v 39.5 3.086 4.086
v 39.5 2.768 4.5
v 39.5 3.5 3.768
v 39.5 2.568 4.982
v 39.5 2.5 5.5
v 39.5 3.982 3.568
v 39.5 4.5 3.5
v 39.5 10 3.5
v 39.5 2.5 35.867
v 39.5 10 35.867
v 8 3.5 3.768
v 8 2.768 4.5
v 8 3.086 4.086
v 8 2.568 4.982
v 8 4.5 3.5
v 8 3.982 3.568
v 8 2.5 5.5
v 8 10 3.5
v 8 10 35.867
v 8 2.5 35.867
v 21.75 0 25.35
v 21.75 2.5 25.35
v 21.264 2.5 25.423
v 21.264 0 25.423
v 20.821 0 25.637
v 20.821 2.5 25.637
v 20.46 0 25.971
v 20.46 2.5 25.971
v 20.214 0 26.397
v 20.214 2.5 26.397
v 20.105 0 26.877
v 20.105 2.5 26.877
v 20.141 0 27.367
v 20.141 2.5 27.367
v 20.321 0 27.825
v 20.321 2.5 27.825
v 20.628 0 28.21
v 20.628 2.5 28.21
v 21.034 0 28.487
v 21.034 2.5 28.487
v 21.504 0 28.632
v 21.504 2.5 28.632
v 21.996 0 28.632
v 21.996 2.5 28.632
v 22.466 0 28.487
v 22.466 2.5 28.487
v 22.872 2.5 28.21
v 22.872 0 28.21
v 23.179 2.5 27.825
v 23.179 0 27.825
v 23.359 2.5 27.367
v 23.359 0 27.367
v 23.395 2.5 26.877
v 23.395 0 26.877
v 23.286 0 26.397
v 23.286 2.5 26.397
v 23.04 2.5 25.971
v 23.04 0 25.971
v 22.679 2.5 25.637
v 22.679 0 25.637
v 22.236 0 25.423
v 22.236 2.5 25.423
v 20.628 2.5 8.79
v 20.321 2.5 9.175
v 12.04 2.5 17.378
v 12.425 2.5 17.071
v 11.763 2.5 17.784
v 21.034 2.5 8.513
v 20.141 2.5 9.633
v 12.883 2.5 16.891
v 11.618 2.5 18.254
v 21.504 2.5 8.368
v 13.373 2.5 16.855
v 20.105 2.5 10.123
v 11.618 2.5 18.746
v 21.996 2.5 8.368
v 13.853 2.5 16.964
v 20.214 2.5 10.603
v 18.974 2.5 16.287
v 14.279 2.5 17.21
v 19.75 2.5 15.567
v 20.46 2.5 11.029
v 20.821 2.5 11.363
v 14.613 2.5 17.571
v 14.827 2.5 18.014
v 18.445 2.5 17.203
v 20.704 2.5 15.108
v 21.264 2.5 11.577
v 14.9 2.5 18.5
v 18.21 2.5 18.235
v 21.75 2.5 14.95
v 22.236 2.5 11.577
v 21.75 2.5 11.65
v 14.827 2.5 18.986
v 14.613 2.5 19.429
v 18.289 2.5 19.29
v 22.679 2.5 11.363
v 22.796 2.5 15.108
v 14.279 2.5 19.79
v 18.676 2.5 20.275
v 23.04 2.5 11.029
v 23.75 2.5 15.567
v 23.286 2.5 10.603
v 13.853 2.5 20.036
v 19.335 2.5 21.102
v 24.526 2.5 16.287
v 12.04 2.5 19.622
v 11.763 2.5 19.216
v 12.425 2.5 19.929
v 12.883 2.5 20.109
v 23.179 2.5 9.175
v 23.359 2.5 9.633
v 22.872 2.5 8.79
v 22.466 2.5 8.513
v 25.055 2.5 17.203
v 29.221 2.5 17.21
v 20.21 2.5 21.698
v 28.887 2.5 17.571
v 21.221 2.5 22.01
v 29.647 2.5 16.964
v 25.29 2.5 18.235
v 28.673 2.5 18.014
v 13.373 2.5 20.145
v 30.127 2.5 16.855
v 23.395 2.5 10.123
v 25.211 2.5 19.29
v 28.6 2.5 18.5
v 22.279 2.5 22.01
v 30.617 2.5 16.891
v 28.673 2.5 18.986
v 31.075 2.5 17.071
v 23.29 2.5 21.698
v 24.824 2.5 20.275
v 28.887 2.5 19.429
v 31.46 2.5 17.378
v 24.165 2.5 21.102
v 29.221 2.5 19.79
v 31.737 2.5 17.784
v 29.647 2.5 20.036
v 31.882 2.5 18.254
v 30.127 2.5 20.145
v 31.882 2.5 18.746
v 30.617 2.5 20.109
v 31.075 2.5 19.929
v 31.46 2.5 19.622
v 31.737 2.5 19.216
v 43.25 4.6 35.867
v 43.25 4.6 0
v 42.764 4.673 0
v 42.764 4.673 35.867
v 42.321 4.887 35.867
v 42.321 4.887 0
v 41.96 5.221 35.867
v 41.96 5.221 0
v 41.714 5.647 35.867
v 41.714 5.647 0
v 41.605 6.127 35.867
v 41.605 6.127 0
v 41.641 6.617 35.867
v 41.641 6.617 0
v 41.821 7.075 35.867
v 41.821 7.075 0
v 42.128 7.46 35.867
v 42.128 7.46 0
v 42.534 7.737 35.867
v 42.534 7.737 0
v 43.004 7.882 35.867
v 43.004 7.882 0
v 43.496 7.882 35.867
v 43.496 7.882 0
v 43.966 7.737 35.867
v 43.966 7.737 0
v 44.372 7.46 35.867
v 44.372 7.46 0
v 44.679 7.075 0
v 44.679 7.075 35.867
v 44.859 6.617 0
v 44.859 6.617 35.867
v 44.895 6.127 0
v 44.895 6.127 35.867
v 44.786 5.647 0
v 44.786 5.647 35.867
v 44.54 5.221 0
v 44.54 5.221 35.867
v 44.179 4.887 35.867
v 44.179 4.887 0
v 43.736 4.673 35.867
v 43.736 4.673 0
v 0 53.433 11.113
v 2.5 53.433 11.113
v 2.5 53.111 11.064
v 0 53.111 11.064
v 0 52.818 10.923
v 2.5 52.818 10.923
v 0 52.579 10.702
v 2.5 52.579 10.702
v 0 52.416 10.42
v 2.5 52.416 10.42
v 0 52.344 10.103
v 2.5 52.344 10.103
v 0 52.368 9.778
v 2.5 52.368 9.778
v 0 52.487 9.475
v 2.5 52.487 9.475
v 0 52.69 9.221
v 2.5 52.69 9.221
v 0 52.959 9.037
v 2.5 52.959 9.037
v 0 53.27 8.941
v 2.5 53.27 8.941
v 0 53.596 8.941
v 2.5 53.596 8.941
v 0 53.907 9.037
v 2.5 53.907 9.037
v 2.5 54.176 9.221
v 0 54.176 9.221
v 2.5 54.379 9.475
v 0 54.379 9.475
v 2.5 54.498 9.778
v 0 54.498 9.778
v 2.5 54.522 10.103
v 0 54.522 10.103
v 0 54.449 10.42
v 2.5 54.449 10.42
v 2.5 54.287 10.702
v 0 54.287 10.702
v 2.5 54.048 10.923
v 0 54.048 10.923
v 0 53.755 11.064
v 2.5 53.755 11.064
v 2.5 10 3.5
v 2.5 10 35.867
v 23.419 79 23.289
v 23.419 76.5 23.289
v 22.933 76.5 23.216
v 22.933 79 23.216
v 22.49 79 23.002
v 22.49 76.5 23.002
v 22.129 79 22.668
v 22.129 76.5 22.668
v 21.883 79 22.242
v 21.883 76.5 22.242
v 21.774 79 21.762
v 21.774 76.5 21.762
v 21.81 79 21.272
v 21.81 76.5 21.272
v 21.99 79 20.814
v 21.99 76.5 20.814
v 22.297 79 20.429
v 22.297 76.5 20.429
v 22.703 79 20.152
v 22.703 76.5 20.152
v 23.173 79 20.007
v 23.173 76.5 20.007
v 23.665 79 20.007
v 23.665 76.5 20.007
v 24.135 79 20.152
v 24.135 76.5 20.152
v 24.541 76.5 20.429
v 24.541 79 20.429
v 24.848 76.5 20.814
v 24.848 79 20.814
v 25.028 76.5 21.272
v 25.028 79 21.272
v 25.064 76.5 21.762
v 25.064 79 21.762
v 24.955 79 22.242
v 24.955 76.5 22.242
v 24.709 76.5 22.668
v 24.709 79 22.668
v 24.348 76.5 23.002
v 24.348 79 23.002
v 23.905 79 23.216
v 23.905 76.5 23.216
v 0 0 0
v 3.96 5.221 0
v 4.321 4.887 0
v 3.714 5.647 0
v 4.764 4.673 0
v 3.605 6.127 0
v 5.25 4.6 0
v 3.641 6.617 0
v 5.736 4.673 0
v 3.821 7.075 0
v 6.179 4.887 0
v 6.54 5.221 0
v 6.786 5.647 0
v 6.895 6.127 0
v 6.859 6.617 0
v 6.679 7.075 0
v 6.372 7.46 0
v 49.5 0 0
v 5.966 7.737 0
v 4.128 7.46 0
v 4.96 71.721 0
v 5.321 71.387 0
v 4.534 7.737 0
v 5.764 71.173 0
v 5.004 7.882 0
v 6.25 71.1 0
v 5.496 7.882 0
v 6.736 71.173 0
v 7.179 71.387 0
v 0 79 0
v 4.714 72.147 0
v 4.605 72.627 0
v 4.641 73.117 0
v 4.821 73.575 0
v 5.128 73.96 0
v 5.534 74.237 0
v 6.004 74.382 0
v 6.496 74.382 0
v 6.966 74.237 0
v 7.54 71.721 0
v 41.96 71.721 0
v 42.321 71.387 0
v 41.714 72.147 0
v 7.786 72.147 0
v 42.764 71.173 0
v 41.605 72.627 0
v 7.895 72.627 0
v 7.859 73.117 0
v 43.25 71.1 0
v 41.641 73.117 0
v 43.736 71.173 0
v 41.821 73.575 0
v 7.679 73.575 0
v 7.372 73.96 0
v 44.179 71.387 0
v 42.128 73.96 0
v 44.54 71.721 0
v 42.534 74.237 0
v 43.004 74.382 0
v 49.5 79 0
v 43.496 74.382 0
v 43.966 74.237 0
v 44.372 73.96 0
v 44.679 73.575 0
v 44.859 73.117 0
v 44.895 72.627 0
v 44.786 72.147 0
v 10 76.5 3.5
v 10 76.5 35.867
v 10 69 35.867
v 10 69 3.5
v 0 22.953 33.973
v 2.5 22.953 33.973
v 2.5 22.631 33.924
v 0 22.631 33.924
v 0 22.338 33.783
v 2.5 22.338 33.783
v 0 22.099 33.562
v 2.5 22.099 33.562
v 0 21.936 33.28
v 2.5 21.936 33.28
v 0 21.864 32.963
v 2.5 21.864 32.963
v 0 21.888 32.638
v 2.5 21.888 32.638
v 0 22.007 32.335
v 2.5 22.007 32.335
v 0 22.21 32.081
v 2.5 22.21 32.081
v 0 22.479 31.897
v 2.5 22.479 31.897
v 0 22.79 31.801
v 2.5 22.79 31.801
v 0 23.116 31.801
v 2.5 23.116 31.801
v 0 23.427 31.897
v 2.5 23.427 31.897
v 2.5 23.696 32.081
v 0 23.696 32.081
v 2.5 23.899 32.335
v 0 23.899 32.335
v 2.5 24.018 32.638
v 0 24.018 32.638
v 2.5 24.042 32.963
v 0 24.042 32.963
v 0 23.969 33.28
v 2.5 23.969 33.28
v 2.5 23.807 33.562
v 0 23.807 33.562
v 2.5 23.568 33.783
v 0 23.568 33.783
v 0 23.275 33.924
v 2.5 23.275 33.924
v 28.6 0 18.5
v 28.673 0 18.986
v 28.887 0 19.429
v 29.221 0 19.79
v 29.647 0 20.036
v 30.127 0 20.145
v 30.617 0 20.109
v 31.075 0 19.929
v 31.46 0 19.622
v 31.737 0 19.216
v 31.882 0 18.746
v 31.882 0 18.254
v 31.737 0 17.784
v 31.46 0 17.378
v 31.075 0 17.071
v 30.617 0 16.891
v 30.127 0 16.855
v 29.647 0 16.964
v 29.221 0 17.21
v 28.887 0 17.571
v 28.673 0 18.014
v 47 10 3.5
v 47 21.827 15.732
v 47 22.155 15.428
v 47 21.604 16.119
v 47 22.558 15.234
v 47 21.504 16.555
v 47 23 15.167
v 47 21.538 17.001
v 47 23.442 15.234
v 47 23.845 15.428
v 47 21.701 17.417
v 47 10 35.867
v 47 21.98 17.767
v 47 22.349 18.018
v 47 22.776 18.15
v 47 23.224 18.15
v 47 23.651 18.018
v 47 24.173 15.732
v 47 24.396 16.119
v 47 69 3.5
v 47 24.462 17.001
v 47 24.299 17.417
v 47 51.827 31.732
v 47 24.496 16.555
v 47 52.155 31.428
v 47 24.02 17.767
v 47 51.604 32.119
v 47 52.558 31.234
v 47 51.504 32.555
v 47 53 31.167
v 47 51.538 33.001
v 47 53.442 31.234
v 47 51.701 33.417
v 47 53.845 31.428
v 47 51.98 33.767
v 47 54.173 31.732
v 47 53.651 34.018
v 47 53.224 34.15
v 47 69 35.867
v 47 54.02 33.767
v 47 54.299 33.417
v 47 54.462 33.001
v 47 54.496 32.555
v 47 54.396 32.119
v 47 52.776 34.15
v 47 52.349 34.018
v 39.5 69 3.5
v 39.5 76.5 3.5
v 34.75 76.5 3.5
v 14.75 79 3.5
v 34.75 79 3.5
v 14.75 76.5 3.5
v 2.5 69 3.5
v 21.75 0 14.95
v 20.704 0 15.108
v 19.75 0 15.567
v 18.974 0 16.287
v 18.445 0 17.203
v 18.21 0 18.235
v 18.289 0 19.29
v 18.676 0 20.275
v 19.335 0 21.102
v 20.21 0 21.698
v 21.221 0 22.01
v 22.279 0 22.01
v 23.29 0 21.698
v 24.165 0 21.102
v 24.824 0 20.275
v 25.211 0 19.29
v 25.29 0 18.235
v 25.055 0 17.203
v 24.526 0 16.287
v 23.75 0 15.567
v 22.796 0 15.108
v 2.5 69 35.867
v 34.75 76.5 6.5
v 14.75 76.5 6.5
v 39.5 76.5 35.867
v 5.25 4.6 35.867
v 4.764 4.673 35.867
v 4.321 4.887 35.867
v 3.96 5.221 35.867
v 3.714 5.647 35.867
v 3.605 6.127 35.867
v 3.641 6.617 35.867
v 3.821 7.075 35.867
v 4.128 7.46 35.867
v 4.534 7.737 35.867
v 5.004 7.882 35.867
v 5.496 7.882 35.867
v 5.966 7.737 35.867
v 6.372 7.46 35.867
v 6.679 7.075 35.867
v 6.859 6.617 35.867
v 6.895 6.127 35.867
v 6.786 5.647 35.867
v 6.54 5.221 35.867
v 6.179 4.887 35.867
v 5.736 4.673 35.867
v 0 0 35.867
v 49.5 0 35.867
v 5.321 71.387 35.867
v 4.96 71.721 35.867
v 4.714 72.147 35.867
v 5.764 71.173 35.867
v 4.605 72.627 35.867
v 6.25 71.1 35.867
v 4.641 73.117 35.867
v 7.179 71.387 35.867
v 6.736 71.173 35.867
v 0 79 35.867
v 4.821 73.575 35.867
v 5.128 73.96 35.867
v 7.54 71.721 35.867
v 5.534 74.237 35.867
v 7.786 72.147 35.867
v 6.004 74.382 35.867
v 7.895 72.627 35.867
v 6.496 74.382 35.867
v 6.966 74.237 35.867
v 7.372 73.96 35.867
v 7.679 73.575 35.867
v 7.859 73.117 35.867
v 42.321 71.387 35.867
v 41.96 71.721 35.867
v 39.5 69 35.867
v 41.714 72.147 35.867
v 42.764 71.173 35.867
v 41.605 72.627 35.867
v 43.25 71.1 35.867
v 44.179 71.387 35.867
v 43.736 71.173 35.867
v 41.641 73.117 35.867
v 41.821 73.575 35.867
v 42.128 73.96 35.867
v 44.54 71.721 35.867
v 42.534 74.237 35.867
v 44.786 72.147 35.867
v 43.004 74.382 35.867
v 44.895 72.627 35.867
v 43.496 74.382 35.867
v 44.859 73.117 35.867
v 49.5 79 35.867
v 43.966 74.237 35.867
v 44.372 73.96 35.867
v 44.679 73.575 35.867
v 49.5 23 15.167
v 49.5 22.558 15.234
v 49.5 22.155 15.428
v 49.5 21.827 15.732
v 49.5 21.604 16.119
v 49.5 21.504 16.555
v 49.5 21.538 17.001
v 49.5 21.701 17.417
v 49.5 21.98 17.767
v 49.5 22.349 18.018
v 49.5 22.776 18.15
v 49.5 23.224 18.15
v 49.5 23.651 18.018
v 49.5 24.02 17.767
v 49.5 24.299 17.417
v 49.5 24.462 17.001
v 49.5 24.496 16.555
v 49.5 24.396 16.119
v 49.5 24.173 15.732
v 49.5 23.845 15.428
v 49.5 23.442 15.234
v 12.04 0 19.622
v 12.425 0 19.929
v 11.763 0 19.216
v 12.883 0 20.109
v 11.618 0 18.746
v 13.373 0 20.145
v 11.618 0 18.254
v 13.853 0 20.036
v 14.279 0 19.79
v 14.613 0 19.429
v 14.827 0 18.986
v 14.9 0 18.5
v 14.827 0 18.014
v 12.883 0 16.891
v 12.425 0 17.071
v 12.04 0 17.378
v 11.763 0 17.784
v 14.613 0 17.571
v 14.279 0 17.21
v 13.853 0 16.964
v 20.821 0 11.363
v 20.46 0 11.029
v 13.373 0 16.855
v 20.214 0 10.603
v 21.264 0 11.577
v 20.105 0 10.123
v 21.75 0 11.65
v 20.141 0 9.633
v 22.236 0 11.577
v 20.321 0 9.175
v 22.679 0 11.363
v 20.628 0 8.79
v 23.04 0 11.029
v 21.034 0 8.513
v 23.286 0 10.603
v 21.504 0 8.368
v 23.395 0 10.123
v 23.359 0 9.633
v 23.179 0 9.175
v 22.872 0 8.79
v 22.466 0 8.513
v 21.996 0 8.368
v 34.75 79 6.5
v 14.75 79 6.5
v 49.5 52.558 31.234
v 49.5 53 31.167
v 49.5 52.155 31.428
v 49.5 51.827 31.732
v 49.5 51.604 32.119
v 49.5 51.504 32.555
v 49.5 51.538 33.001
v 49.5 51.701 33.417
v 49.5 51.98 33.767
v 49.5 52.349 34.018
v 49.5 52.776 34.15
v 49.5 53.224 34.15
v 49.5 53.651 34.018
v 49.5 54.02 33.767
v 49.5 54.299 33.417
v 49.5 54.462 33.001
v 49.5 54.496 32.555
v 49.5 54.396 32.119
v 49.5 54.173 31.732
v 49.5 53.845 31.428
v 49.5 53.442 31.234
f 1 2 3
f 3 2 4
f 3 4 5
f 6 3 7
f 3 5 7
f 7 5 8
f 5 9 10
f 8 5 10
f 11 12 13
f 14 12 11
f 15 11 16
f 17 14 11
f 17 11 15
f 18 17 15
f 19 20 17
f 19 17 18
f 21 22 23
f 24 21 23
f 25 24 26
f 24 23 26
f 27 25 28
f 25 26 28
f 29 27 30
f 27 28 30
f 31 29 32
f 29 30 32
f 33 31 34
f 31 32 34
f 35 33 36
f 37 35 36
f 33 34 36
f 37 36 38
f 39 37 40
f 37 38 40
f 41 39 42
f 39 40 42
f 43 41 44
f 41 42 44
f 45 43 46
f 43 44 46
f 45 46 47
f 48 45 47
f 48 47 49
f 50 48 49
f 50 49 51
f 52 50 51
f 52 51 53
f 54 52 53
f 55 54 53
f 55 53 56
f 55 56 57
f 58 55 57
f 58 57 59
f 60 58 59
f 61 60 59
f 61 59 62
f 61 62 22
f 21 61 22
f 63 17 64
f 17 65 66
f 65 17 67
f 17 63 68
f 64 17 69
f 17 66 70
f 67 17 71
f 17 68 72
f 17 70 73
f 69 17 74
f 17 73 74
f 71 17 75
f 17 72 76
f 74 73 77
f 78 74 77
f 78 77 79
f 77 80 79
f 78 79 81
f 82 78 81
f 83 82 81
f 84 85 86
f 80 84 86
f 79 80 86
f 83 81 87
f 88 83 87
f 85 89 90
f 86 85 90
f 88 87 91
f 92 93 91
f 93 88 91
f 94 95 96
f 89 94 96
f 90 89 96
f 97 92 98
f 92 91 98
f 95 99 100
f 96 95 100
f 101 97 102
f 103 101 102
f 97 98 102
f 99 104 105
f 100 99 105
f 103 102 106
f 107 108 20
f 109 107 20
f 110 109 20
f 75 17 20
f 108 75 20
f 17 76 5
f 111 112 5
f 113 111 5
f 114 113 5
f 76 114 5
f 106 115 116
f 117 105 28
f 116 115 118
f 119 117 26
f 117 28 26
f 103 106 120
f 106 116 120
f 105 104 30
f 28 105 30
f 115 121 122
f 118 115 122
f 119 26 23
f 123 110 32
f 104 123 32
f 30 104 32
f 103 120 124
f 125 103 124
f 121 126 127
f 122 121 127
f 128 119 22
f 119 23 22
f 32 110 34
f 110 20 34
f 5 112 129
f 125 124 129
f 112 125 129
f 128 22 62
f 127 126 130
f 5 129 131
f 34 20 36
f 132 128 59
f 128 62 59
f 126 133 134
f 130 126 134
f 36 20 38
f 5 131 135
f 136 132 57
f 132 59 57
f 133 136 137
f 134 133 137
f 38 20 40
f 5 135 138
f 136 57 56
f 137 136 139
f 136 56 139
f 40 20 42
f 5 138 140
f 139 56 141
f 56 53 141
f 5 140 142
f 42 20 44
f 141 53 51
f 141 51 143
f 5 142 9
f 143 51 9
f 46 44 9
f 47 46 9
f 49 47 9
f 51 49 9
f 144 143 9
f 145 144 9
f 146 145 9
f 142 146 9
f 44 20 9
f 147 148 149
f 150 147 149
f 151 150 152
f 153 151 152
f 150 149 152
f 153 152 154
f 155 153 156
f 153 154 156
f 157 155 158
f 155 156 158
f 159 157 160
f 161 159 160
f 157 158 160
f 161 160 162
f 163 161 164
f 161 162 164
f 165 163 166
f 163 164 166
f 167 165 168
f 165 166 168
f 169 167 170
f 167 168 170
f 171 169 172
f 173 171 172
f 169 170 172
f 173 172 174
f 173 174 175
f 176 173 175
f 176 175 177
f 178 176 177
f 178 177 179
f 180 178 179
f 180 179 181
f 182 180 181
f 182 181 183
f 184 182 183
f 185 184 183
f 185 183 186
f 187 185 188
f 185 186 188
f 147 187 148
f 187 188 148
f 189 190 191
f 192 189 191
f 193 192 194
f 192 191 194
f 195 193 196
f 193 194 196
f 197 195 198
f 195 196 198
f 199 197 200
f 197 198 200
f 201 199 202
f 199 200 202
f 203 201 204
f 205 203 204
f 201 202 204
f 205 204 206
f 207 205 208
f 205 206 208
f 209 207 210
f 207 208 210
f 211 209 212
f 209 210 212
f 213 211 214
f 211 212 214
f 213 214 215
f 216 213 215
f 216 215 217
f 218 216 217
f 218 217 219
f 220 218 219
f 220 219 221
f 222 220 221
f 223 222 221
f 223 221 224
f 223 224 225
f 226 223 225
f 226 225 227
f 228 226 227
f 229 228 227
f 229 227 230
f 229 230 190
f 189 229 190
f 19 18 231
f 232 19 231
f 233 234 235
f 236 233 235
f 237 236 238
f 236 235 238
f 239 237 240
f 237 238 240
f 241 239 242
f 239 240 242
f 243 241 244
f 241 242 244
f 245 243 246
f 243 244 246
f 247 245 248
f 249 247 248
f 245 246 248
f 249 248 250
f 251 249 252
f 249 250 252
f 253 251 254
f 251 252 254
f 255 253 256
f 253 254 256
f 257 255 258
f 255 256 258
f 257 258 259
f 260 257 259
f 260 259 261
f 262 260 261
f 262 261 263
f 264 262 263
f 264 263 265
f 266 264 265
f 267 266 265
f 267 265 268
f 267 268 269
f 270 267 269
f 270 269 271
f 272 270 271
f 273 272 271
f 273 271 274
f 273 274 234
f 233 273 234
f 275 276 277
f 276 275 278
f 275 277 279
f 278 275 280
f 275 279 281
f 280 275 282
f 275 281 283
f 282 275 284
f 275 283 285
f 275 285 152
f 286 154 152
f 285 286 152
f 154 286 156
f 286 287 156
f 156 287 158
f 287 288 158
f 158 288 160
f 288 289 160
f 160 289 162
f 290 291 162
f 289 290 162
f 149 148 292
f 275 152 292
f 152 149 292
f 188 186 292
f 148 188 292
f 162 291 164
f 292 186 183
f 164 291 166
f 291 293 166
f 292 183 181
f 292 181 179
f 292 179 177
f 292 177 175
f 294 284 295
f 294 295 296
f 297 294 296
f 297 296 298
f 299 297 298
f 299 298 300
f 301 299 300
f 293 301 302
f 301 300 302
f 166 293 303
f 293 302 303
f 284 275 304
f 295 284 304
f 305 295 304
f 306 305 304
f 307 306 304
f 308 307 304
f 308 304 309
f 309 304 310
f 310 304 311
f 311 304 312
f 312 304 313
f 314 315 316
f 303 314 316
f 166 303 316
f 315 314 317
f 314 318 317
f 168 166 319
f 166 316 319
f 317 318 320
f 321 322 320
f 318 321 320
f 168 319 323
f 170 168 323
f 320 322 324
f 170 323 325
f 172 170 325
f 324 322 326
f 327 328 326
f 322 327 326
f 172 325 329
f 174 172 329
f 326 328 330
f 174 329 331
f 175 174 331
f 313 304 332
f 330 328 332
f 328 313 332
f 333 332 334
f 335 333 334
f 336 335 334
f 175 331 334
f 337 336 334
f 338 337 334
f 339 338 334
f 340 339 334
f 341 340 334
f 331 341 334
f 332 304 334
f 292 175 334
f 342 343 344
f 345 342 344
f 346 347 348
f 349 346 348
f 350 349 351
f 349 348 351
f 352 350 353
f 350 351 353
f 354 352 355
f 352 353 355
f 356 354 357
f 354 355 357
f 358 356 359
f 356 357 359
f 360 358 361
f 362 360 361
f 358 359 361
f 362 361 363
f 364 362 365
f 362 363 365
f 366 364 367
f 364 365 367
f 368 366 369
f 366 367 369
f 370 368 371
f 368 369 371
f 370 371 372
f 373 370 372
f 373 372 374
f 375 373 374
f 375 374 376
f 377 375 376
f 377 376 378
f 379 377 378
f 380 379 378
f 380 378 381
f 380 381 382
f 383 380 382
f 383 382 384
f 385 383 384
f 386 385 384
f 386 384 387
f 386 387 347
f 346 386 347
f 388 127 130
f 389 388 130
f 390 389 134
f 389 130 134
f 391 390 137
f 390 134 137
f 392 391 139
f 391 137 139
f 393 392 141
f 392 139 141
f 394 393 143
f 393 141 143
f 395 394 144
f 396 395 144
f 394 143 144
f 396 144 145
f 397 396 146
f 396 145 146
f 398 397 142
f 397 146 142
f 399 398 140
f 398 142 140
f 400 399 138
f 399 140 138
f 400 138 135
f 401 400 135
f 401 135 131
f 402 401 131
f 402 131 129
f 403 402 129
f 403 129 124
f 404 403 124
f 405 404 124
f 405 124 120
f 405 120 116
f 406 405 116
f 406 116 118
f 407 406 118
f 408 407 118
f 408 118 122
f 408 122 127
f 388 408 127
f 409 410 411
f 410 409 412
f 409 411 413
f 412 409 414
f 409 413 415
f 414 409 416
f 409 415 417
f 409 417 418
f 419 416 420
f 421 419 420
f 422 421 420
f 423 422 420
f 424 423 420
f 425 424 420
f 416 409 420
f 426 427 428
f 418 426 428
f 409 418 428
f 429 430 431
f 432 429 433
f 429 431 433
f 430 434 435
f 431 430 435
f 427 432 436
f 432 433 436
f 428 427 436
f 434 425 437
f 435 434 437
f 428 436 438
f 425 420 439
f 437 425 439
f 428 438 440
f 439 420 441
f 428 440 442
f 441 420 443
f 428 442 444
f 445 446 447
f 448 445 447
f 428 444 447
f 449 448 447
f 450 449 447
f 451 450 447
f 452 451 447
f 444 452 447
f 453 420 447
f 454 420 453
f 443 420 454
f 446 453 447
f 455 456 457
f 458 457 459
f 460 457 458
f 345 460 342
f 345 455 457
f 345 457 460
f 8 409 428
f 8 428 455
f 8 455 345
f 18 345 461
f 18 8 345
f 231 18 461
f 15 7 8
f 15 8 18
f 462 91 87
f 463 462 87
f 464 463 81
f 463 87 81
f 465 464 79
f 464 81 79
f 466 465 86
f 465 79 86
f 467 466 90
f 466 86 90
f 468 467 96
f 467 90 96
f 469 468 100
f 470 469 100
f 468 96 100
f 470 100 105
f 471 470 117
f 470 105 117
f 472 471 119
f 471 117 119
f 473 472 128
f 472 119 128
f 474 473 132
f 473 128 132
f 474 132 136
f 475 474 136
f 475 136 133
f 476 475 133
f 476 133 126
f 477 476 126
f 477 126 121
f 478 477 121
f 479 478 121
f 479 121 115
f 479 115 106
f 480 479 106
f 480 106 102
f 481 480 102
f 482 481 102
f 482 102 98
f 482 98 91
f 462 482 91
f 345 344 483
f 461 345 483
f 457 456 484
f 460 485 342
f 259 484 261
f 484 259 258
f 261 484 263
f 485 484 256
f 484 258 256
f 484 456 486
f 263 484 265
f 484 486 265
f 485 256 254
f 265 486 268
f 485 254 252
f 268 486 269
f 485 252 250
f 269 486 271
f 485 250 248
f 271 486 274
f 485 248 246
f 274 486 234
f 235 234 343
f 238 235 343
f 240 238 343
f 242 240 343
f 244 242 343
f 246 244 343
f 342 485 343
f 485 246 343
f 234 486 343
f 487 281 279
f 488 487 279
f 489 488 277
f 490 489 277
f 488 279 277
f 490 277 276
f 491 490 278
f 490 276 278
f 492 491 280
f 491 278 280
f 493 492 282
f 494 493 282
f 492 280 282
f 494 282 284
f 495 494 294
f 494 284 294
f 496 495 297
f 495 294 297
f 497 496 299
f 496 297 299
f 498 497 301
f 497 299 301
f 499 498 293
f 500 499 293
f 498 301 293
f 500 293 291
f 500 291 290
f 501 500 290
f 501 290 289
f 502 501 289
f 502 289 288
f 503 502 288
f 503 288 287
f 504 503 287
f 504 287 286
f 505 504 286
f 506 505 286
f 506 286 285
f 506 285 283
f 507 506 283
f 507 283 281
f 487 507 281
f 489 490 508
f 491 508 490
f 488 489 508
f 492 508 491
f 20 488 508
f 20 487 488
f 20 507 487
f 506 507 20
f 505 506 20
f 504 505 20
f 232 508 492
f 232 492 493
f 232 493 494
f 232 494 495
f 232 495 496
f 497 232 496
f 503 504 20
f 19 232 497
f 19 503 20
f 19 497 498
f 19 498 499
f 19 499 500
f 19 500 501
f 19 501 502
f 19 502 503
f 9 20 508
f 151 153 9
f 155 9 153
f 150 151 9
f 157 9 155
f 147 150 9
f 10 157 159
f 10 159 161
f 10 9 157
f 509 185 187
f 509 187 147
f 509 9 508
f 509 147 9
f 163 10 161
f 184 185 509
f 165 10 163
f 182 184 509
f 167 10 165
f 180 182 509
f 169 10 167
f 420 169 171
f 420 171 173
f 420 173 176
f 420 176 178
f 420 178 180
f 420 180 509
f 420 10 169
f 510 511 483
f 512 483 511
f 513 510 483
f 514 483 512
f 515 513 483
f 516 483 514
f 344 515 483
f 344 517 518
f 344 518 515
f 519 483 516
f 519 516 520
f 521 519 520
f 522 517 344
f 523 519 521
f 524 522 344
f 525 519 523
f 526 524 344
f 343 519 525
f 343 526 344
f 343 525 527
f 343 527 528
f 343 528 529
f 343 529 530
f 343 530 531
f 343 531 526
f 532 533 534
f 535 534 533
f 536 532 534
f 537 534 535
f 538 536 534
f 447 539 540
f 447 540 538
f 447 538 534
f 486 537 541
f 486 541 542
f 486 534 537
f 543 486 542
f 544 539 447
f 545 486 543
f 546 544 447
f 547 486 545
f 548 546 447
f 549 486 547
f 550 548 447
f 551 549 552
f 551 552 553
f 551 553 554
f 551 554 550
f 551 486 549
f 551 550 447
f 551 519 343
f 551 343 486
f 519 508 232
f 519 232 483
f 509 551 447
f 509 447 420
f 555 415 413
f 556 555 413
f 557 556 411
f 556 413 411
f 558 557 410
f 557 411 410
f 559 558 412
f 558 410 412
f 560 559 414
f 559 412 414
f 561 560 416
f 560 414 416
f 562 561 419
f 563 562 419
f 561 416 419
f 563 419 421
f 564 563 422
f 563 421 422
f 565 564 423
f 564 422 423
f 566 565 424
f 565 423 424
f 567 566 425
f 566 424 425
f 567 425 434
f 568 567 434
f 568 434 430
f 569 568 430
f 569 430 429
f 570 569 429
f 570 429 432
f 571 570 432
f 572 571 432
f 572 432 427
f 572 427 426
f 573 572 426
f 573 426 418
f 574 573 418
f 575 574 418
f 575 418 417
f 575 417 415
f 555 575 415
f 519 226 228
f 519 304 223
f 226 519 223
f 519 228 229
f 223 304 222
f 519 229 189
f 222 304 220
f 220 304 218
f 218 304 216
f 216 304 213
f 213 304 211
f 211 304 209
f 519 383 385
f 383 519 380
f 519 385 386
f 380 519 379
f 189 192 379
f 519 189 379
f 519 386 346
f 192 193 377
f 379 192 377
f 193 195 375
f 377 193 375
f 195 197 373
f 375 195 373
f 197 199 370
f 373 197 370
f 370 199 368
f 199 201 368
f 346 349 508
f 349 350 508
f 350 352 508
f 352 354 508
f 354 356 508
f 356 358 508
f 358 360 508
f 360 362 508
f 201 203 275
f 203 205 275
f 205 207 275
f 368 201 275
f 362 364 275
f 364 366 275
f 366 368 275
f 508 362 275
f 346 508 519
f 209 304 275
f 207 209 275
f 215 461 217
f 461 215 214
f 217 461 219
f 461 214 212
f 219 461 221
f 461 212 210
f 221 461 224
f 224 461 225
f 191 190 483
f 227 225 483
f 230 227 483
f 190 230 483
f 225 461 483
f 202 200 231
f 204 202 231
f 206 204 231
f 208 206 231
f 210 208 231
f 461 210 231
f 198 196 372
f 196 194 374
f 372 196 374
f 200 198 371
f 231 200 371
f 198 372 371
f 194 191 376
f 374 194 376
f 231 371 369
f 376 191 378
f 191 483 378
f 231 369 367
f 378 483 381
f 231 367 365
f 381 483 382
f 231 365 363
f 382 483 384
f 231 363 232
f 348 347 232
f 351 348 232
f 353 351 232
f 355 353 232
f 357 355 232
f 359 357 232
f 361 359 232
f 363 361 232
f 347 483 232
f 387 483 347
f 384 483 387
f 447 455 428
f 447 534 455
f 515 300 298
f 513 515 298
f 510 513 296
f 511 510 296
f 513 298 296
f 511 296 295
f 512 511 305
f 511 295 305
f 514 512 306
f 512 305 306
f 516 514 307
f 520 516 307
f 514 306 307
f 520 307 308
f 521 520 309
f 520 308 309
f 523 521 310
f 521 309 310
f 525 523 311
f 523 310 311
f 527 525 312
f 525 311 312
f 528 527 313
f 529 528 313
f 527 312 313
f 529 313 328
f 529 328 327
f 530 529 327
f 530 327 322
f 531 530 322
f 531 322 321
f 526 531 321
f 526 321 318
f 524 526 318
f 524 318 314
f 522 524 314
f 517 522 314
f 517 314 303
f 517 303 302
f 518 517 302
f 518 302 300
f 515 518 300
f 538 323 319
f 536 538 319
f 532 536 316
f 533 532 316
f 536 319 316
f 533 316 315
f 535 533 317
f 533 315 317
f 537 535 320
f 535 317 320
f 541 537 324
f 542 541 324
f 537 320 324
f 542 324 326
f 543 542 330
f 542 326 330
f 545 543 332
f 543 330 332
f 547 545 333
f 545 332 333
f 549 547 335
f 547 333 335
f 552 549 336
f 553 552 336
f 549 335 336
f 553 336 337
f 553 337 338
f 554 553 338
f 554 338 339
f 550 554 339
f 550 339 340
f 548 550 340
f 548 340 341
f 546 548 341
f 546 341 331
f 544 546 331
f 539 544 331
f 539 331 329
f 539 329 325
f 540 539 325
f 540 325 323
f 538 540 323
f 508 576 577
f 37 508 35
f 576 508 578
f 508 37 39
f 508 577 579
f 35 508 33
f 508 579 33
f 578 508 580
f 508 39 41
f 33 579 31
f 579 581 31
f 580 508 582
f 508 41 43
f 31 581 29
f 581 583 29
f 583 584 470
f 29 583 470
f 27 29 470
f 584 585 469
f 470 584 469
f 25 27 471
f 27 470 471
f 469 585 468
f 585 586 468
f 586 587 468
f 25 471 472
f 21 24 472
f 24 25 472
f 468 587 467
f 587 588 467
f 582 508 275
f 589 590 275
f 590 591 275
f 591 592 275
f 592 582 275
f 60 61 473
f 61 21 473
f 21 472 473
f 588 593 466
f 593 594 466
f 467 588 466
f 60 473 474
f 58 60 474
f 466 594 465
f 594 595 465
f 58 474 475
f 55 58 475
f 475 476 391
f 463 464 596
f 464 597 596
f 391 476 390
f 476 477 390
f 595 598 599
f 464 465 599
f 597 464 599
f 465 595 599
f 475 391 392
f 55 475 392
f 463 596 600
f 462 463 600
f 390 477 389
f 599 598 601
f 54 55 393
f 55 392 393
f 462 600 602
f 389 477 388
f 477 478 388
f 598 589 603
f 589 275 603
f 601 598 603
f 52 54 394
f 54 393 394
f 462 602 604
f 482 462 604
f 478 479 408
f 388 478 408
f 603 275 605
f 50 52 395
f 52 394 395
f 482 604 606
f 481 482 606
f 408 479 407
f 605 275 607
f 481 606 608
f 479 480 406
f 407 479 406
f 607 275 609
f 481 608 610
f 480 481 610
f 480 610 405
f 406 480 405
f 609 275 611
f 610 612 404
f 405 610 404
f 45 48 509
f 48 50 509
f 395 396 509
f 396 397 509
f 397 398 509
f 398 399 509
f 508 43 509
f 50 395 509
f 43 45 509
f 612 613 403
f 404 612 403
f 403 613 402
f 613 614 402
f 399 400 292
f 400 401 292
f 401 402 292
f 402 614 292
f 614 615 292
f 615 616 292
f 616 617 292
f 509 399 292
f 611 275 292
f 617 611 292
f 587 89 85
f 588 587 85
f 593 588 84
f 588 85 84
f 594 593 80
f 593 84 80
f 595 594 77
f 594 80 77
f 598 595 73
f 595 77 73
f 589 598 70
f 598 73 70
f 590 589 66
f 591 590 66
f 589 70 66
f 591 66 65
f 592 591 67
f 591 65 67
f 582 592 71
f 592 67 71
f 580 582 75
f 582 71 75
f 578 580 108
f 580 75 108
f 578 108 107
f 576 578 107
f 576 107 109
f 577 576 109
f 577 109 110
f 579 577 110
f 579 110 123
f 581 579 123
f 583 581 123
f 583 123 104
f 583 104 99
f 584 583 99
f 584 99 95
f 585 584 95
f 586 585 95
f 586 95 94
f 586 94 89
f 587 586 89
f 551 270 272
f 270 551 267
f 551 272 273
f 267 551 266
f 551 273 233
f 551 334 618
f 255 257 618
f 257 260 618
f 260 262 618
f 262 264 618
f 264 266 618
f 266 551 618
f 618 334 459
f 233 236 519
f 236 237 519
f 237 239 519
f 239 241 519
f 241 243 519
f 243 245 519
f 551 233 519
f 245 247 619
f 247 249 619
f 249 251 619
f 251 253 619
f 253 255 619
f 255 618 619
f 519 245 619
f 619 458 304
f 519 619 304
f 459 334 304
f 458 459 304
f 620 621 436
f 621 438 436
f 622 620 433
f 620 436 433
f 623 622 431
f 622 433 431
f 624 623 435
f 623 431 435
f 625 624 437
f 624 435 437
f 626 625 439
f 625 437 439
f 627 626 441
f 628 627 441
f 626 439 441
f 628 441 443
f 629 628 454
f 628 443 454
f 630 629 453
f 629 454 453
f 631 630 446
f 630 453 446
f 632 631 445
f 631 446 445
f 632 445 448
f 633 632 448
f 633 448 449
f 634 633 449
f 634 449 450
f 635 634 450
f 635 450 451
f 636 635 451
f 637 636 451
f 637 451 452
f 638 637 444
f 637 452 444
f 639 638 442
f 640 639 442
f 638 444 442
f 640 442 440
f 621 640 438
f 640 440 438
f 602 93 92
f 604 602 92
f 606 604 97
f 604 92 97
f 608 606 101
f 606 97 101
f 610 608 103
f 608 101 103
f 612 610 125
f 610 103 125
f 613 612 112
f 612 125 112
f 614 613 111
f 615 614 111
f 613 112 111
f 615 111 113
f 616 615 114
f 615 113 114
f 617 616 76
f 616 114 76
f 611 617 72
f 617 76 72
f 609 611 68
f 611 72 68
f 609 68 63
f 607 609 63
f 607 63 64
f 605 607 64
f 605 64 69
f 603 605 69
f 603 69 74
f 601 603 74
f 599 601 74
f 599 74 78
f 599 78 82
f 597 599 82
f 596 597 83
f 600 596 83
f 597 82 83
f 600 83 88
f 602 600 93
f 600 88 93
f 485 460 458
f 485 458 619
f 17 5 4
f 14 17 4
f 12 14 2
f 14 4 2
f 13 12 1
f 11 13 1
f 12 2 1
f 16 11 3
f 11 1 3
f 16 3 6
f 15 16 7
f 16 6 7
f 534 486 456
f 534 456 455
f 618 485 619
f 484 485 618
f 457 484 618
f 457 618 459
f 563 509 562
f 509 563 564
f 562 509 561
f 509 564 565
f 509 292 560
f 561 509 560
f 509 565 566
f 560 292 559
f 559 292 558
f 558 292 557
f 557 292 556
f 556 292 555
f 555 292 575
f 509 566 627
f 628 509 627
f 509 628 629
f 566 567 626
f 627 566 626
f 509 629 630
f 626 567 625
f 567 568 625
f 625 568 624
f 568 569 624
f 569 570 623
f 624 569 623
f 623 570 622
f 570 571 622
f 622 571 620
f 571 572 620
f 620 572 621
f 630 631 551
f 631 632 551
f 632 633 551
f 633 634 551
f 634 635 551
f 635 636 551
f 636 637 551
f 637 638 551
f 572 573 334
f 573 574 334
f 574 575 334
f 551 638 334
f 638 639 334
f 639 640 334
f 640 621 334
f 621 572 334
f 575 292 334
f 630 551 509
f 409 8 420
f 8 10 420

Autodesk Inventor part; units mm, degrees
ref_plane "YZ Plane" through (0, 0, 0) normal (1, 0, 0) x (0, 1, 0)
ref_plane "XZ Plane" through (0, 0, 0) normal (0, 1, 0) x (-1, 0, 0)
ref_plane "XY Plane" through (0, 0, 0) normal (0, 0, 1) x (1, 0, 0)
sketch "Sketch1" plane through (0, 0, 0) normal (0, 0, 1) x (1, 0, 0)
  line L0 (0, 0) -> (49.5, 0)
  line L1 (49.5, 0) -> (49.5, 79)
  line L2 (49.5, 79) -> (0, 79)
  line L3 (0, 79) -> (0, 0)
  dimension "d0" = 49.5
  dimension "d1" = 79
extrude "Extrusion1" add sketch "Sketch1" along normal blind 35.867
sketch "Sketch2" plane through (0, 0, 35.867) normal (0, 0, 1) x (1, 0, 0)
  line L0 (0, 79) -> (0, 0) construction
  line L1 (49.5, 79) -> (0, 79) construction
  line L2 (49.5, 0) -> (49.5, 79) construction
  line L3 (0, 0) -> (49.5, 0) construction
  line L4 (2.5, 2.5) -> (47, 2.5)
  line L5 (47, 2.5) -> (47, 76.5)
  line L6 (47, 76.5) -> (2.5, 76.5)
  line L7 (2.5, 76.5) -> (2.5, 2.5)
  dimension "d4" = 2.5
  dimension "d5" = 2.5
  dimension "d6" = 2.5
  dimension "d7" = 2.5
extrude "Extrusion2" cut sketch "Sketch2" against normal blind 32.367
sketch "Sketch3" plane through (0, 0, 0) normal (0, -1, 0) x (1, 0, 0)
  line L0 (0, 0) -> (49.5, 0) construction
  line L1 (49.5, 0) -> (49.5, 35.867) construction
  line L2 (0, 35.867) -> (49.5, 35.867) construction
  line L3 (0, 0) -> (0, 35.867) construction
  point P0 (21.75, 18.5)
  point P1 (24.75, 35.867)
  dimension "d12" = 17.367
  dimension "d31" = 21.75
hole "Hole1" at (21.75, 0, 18.5) direction (0, 1, 0) diameter 7.1 depth 2.5
sketch "Sketch4" plane through (0, 0, 0) normal (0, -1, 0) x (1, 0, 0)
  circle A0 centre (21.75, 18.5) radius 3.55 construction
  line L0 (0, 0) -> (49.5, 0) construction
  line L1 (49.5, 0) -> (49.5, 35.867) construction
  line L2 (0, 35.867) -> (49.5, 35.867) construction
  line L3 (0, 0) -> (0, 35.867) construction
  point P0 (21.75, 27)
  dimension "d20" = 8.5
hole "Hole2" at (21.75, 0, 27) direction (0, 1, 0) diameter 3.3 depth 2.5
pattern_circular "Circular Pattern1" count 4 over 360 about axis through (21.75, 99.8884, 18.5) along (0, -1, 0) of "Hole2"
sketch "Sketch5" plane through (0, 0, 0) normal (-1, 0, 0) x (0, 0, 1)
  line L0 (35.867, 79) -> (35.867, 0) projected
  line L1 (0, 0) -> (35.867, 0) projected
  point P0 (32.881, 22.9529)
  point P1 (10.021, 53.4329)
  dimension "d32" = 2.986
  dimension "d33" = 30.48
  dimension "d34" = 22.86
  dimension "d35" = 22.9529
hole "Hole3" at (0, 22.9529, 32.881) at (0, 53.4329, 10.021) direction (1, 0, 0) diameter 2.184 depth 2.5
fillet "Fillet3" radius 2 3 edges at (24.75, 2.5, 3.5) (47, 2.5, 19.6835) (2.5, 2.5, 19.6835)
sketch "Sketch6" plane through (49.5, 0, 0) normal (1, 0, 0) x (0, 0, -1)
  line L0 (-35.867, 0) -> (-35.867, 79) projected
  line L1 (0, 79) -> (-35.867, 79) projected
  point P0 (0, 0)
  point P1 (-16.667, 23)
  point P2 (-32.667, 53)
  dimension "d44" = 30
  dimension "d47" = 26
  dimension "d55" = 3.2
  dimension "d56" = 16
hole "Hole4" at (49.5, 23, 16.667) at (49.5, 53, 32.667) direction (-1, 0, 0) diameter 3 depth 2.5
sketch "Sketch7" plane through (0, 0, 35.867) normal (0, 0, 1) x (1, 0, 0)
  line L0 (49.5, 0) -> (39.5, 0)
  line L1 (39.5, 0) -> (39.5, 10)
  line L2 (39.5, 10) -> (49.5, 10)
  line L3 (49.5, 10) -> (49.5, 0)
  line L4 (0, 0) -> (8, 0)
  line L5 (8, 0) -> (8, 10)
  line L6 (8, 10) -> (0, 10)
  line L7 (0, 10) -> (0, 0)
  line L8 (0, 79) -> (10, 79)
  line L9 (10, 79) -> (10, 69)
  line L10 (10, 69) -> (0, 69)
  line L11 (0, 69) -> (0, 79)
  line L12 (49.5, 79) -> (39.5, 79)
  line L13 (39.5, 79) -> (39.5, 69)
  line L14 (39.5, 69) -> (49.5, 69)
  line L15 (49.5, 69) -> (49.5, 79)
  line L16 (49.5, 79) -> (0, 79) projected
  line L17 (49.5, 0) -> (49.5, 79) projected
  point P0 (4, 0)
  point P1 (44.5, 0)
  point P2 (5, 79)
  point P3 (44.5, 79)
  point P4 (49.5, 74)
  point P5 (49.5, 5)
  point P6 (0, 74)
  point P7 (0, 5)
  point P8 (24.75, 79)
  point P9 (49.5, 39.5)
  dimension "d57" = 10
  dimension "d58" = 8
  dimension "d59" = 10
  dimension "d60" = 10
  dimension "d61" = 10
  dimension "d62" = 10
  dimension "d63" = 10
  dimension "d64" = 10
extrude "Extrusion3" add sketch "Sketch7" against normal up to surface (32.367 mm away)
sketch "Sketch8" plane through (0, 0, 35.867) normal (0, 0, 1) x (1, 0, 0)
  line L0 (39.5, 2.5) -> (8, 2.5) construction
  line L1 (8, 2.5) -> (8, 10) construction
  line L2 (8, 10) -> (2.5, 10) construction
  line L3 (2.5, 10) -> (2.5, 69) construction
  line L4 (2.5, 69) -> (10, 69) construction
  line L5 (10, 69) -> (10, 76.5) construction
  line L6 (10, 76.5) -> (39.5, 76.5) construction
  line L7 (39.5, 76.5) -> (39.5, 69) construction
  line L8 (39.5, 69) -> (47, 69) construction
  line L9 (47, 69) -> (47, 10) construction
  line L10 (47, 10) -> (39.5, 10) construction
  line L11 (39.5, 10) -> (39.5, 2.5) construction
  line L12 (49.5, 79) -> (0, 79) construction
  line L13 (0, 79) -> (0, 0) construction
  line L14 (0, 0) -> (49.5, 0) construction
  line L15 (49.5, 0) -> (49.5, 79) construction
  point P0 (5.25, 6.25)
  point P1 (43.25, 6.25)
  point P2 (43.25, 72.75)
  point P3 (6.25, 72.75)
  point P4 (5.25, 10)
  point P5 (8, 6.25)
  point P6 (39.5, 6.25)
  point P7 (39.5, 72.75)
  point P8 (10, 72.75)
  point P9 (6.25, 69)
  point P10 (43.25, 69)
  point P11 (43.25, 10)
hole "Hole5" at (5.25, 6.25, 35.867) at (43.25, 6.25, 35.867) at (43.25, 72.75, 35.867) at (6.25, 72.75, 35.867) direction (0, 0, -1) diameter 3.3 end through all
sketch "Sketch9" plane through (0, 79, 0) normal (0, 1, 0) x (1, 0, 0)
  line L0 (49.5, -35.867) -> (0, -35.867) projected
  point P0 (0, 0)
  point P1 (23.419, -21.639)
  point P2 (24.75, -35.867)
  point P3 (10, -35.867)
  dimension "d75" = 14.228
  dimension "d87" = 13.419
hole "Hole6" at (23.419, 79, 21.639) direction (0, -1, 0) diameter 3.3 depth 2.5
sketch "Sketch10" plane through (10, 76.5, 35.867) normal (0, -1, 0) x (1, 0, 0)
  line L0 (0, -32.367) -> (29.5, -32.367) construction
  circle A0 centre (13.419, -14.228) radius 1.65 construction
  line L1 (0, 0) -> (0, -32.367) construction
  line L2 (0, -32.367) -> (29.5, -32.367) construction
  line L3 (29.5, -32.367) -> (29.5, 0) construction
  line L4 (0, 0) -> (29.5, 0) construction
  line L5 (24.75, -32.367) -> (4.75, -32.367)
  line L6 (4.75, -32.367) -> (4.75, -29.367)
  line L7 (4.75, -29.367) -> (24.75, -29.367)
  line L8 (24.75, -29.367) -> (24.75, -32.367)
  point P0 (-10, -35.867)
  point P1 (14.75, -29.367)
  point P2 (14.75, 0)
  dimension "d83" = 20
  dimension "d84" = 3
extrude "Extrusion4" cut sketch "Sketch10" against normal through all
properties part number "Parte de abajo contenedor"
